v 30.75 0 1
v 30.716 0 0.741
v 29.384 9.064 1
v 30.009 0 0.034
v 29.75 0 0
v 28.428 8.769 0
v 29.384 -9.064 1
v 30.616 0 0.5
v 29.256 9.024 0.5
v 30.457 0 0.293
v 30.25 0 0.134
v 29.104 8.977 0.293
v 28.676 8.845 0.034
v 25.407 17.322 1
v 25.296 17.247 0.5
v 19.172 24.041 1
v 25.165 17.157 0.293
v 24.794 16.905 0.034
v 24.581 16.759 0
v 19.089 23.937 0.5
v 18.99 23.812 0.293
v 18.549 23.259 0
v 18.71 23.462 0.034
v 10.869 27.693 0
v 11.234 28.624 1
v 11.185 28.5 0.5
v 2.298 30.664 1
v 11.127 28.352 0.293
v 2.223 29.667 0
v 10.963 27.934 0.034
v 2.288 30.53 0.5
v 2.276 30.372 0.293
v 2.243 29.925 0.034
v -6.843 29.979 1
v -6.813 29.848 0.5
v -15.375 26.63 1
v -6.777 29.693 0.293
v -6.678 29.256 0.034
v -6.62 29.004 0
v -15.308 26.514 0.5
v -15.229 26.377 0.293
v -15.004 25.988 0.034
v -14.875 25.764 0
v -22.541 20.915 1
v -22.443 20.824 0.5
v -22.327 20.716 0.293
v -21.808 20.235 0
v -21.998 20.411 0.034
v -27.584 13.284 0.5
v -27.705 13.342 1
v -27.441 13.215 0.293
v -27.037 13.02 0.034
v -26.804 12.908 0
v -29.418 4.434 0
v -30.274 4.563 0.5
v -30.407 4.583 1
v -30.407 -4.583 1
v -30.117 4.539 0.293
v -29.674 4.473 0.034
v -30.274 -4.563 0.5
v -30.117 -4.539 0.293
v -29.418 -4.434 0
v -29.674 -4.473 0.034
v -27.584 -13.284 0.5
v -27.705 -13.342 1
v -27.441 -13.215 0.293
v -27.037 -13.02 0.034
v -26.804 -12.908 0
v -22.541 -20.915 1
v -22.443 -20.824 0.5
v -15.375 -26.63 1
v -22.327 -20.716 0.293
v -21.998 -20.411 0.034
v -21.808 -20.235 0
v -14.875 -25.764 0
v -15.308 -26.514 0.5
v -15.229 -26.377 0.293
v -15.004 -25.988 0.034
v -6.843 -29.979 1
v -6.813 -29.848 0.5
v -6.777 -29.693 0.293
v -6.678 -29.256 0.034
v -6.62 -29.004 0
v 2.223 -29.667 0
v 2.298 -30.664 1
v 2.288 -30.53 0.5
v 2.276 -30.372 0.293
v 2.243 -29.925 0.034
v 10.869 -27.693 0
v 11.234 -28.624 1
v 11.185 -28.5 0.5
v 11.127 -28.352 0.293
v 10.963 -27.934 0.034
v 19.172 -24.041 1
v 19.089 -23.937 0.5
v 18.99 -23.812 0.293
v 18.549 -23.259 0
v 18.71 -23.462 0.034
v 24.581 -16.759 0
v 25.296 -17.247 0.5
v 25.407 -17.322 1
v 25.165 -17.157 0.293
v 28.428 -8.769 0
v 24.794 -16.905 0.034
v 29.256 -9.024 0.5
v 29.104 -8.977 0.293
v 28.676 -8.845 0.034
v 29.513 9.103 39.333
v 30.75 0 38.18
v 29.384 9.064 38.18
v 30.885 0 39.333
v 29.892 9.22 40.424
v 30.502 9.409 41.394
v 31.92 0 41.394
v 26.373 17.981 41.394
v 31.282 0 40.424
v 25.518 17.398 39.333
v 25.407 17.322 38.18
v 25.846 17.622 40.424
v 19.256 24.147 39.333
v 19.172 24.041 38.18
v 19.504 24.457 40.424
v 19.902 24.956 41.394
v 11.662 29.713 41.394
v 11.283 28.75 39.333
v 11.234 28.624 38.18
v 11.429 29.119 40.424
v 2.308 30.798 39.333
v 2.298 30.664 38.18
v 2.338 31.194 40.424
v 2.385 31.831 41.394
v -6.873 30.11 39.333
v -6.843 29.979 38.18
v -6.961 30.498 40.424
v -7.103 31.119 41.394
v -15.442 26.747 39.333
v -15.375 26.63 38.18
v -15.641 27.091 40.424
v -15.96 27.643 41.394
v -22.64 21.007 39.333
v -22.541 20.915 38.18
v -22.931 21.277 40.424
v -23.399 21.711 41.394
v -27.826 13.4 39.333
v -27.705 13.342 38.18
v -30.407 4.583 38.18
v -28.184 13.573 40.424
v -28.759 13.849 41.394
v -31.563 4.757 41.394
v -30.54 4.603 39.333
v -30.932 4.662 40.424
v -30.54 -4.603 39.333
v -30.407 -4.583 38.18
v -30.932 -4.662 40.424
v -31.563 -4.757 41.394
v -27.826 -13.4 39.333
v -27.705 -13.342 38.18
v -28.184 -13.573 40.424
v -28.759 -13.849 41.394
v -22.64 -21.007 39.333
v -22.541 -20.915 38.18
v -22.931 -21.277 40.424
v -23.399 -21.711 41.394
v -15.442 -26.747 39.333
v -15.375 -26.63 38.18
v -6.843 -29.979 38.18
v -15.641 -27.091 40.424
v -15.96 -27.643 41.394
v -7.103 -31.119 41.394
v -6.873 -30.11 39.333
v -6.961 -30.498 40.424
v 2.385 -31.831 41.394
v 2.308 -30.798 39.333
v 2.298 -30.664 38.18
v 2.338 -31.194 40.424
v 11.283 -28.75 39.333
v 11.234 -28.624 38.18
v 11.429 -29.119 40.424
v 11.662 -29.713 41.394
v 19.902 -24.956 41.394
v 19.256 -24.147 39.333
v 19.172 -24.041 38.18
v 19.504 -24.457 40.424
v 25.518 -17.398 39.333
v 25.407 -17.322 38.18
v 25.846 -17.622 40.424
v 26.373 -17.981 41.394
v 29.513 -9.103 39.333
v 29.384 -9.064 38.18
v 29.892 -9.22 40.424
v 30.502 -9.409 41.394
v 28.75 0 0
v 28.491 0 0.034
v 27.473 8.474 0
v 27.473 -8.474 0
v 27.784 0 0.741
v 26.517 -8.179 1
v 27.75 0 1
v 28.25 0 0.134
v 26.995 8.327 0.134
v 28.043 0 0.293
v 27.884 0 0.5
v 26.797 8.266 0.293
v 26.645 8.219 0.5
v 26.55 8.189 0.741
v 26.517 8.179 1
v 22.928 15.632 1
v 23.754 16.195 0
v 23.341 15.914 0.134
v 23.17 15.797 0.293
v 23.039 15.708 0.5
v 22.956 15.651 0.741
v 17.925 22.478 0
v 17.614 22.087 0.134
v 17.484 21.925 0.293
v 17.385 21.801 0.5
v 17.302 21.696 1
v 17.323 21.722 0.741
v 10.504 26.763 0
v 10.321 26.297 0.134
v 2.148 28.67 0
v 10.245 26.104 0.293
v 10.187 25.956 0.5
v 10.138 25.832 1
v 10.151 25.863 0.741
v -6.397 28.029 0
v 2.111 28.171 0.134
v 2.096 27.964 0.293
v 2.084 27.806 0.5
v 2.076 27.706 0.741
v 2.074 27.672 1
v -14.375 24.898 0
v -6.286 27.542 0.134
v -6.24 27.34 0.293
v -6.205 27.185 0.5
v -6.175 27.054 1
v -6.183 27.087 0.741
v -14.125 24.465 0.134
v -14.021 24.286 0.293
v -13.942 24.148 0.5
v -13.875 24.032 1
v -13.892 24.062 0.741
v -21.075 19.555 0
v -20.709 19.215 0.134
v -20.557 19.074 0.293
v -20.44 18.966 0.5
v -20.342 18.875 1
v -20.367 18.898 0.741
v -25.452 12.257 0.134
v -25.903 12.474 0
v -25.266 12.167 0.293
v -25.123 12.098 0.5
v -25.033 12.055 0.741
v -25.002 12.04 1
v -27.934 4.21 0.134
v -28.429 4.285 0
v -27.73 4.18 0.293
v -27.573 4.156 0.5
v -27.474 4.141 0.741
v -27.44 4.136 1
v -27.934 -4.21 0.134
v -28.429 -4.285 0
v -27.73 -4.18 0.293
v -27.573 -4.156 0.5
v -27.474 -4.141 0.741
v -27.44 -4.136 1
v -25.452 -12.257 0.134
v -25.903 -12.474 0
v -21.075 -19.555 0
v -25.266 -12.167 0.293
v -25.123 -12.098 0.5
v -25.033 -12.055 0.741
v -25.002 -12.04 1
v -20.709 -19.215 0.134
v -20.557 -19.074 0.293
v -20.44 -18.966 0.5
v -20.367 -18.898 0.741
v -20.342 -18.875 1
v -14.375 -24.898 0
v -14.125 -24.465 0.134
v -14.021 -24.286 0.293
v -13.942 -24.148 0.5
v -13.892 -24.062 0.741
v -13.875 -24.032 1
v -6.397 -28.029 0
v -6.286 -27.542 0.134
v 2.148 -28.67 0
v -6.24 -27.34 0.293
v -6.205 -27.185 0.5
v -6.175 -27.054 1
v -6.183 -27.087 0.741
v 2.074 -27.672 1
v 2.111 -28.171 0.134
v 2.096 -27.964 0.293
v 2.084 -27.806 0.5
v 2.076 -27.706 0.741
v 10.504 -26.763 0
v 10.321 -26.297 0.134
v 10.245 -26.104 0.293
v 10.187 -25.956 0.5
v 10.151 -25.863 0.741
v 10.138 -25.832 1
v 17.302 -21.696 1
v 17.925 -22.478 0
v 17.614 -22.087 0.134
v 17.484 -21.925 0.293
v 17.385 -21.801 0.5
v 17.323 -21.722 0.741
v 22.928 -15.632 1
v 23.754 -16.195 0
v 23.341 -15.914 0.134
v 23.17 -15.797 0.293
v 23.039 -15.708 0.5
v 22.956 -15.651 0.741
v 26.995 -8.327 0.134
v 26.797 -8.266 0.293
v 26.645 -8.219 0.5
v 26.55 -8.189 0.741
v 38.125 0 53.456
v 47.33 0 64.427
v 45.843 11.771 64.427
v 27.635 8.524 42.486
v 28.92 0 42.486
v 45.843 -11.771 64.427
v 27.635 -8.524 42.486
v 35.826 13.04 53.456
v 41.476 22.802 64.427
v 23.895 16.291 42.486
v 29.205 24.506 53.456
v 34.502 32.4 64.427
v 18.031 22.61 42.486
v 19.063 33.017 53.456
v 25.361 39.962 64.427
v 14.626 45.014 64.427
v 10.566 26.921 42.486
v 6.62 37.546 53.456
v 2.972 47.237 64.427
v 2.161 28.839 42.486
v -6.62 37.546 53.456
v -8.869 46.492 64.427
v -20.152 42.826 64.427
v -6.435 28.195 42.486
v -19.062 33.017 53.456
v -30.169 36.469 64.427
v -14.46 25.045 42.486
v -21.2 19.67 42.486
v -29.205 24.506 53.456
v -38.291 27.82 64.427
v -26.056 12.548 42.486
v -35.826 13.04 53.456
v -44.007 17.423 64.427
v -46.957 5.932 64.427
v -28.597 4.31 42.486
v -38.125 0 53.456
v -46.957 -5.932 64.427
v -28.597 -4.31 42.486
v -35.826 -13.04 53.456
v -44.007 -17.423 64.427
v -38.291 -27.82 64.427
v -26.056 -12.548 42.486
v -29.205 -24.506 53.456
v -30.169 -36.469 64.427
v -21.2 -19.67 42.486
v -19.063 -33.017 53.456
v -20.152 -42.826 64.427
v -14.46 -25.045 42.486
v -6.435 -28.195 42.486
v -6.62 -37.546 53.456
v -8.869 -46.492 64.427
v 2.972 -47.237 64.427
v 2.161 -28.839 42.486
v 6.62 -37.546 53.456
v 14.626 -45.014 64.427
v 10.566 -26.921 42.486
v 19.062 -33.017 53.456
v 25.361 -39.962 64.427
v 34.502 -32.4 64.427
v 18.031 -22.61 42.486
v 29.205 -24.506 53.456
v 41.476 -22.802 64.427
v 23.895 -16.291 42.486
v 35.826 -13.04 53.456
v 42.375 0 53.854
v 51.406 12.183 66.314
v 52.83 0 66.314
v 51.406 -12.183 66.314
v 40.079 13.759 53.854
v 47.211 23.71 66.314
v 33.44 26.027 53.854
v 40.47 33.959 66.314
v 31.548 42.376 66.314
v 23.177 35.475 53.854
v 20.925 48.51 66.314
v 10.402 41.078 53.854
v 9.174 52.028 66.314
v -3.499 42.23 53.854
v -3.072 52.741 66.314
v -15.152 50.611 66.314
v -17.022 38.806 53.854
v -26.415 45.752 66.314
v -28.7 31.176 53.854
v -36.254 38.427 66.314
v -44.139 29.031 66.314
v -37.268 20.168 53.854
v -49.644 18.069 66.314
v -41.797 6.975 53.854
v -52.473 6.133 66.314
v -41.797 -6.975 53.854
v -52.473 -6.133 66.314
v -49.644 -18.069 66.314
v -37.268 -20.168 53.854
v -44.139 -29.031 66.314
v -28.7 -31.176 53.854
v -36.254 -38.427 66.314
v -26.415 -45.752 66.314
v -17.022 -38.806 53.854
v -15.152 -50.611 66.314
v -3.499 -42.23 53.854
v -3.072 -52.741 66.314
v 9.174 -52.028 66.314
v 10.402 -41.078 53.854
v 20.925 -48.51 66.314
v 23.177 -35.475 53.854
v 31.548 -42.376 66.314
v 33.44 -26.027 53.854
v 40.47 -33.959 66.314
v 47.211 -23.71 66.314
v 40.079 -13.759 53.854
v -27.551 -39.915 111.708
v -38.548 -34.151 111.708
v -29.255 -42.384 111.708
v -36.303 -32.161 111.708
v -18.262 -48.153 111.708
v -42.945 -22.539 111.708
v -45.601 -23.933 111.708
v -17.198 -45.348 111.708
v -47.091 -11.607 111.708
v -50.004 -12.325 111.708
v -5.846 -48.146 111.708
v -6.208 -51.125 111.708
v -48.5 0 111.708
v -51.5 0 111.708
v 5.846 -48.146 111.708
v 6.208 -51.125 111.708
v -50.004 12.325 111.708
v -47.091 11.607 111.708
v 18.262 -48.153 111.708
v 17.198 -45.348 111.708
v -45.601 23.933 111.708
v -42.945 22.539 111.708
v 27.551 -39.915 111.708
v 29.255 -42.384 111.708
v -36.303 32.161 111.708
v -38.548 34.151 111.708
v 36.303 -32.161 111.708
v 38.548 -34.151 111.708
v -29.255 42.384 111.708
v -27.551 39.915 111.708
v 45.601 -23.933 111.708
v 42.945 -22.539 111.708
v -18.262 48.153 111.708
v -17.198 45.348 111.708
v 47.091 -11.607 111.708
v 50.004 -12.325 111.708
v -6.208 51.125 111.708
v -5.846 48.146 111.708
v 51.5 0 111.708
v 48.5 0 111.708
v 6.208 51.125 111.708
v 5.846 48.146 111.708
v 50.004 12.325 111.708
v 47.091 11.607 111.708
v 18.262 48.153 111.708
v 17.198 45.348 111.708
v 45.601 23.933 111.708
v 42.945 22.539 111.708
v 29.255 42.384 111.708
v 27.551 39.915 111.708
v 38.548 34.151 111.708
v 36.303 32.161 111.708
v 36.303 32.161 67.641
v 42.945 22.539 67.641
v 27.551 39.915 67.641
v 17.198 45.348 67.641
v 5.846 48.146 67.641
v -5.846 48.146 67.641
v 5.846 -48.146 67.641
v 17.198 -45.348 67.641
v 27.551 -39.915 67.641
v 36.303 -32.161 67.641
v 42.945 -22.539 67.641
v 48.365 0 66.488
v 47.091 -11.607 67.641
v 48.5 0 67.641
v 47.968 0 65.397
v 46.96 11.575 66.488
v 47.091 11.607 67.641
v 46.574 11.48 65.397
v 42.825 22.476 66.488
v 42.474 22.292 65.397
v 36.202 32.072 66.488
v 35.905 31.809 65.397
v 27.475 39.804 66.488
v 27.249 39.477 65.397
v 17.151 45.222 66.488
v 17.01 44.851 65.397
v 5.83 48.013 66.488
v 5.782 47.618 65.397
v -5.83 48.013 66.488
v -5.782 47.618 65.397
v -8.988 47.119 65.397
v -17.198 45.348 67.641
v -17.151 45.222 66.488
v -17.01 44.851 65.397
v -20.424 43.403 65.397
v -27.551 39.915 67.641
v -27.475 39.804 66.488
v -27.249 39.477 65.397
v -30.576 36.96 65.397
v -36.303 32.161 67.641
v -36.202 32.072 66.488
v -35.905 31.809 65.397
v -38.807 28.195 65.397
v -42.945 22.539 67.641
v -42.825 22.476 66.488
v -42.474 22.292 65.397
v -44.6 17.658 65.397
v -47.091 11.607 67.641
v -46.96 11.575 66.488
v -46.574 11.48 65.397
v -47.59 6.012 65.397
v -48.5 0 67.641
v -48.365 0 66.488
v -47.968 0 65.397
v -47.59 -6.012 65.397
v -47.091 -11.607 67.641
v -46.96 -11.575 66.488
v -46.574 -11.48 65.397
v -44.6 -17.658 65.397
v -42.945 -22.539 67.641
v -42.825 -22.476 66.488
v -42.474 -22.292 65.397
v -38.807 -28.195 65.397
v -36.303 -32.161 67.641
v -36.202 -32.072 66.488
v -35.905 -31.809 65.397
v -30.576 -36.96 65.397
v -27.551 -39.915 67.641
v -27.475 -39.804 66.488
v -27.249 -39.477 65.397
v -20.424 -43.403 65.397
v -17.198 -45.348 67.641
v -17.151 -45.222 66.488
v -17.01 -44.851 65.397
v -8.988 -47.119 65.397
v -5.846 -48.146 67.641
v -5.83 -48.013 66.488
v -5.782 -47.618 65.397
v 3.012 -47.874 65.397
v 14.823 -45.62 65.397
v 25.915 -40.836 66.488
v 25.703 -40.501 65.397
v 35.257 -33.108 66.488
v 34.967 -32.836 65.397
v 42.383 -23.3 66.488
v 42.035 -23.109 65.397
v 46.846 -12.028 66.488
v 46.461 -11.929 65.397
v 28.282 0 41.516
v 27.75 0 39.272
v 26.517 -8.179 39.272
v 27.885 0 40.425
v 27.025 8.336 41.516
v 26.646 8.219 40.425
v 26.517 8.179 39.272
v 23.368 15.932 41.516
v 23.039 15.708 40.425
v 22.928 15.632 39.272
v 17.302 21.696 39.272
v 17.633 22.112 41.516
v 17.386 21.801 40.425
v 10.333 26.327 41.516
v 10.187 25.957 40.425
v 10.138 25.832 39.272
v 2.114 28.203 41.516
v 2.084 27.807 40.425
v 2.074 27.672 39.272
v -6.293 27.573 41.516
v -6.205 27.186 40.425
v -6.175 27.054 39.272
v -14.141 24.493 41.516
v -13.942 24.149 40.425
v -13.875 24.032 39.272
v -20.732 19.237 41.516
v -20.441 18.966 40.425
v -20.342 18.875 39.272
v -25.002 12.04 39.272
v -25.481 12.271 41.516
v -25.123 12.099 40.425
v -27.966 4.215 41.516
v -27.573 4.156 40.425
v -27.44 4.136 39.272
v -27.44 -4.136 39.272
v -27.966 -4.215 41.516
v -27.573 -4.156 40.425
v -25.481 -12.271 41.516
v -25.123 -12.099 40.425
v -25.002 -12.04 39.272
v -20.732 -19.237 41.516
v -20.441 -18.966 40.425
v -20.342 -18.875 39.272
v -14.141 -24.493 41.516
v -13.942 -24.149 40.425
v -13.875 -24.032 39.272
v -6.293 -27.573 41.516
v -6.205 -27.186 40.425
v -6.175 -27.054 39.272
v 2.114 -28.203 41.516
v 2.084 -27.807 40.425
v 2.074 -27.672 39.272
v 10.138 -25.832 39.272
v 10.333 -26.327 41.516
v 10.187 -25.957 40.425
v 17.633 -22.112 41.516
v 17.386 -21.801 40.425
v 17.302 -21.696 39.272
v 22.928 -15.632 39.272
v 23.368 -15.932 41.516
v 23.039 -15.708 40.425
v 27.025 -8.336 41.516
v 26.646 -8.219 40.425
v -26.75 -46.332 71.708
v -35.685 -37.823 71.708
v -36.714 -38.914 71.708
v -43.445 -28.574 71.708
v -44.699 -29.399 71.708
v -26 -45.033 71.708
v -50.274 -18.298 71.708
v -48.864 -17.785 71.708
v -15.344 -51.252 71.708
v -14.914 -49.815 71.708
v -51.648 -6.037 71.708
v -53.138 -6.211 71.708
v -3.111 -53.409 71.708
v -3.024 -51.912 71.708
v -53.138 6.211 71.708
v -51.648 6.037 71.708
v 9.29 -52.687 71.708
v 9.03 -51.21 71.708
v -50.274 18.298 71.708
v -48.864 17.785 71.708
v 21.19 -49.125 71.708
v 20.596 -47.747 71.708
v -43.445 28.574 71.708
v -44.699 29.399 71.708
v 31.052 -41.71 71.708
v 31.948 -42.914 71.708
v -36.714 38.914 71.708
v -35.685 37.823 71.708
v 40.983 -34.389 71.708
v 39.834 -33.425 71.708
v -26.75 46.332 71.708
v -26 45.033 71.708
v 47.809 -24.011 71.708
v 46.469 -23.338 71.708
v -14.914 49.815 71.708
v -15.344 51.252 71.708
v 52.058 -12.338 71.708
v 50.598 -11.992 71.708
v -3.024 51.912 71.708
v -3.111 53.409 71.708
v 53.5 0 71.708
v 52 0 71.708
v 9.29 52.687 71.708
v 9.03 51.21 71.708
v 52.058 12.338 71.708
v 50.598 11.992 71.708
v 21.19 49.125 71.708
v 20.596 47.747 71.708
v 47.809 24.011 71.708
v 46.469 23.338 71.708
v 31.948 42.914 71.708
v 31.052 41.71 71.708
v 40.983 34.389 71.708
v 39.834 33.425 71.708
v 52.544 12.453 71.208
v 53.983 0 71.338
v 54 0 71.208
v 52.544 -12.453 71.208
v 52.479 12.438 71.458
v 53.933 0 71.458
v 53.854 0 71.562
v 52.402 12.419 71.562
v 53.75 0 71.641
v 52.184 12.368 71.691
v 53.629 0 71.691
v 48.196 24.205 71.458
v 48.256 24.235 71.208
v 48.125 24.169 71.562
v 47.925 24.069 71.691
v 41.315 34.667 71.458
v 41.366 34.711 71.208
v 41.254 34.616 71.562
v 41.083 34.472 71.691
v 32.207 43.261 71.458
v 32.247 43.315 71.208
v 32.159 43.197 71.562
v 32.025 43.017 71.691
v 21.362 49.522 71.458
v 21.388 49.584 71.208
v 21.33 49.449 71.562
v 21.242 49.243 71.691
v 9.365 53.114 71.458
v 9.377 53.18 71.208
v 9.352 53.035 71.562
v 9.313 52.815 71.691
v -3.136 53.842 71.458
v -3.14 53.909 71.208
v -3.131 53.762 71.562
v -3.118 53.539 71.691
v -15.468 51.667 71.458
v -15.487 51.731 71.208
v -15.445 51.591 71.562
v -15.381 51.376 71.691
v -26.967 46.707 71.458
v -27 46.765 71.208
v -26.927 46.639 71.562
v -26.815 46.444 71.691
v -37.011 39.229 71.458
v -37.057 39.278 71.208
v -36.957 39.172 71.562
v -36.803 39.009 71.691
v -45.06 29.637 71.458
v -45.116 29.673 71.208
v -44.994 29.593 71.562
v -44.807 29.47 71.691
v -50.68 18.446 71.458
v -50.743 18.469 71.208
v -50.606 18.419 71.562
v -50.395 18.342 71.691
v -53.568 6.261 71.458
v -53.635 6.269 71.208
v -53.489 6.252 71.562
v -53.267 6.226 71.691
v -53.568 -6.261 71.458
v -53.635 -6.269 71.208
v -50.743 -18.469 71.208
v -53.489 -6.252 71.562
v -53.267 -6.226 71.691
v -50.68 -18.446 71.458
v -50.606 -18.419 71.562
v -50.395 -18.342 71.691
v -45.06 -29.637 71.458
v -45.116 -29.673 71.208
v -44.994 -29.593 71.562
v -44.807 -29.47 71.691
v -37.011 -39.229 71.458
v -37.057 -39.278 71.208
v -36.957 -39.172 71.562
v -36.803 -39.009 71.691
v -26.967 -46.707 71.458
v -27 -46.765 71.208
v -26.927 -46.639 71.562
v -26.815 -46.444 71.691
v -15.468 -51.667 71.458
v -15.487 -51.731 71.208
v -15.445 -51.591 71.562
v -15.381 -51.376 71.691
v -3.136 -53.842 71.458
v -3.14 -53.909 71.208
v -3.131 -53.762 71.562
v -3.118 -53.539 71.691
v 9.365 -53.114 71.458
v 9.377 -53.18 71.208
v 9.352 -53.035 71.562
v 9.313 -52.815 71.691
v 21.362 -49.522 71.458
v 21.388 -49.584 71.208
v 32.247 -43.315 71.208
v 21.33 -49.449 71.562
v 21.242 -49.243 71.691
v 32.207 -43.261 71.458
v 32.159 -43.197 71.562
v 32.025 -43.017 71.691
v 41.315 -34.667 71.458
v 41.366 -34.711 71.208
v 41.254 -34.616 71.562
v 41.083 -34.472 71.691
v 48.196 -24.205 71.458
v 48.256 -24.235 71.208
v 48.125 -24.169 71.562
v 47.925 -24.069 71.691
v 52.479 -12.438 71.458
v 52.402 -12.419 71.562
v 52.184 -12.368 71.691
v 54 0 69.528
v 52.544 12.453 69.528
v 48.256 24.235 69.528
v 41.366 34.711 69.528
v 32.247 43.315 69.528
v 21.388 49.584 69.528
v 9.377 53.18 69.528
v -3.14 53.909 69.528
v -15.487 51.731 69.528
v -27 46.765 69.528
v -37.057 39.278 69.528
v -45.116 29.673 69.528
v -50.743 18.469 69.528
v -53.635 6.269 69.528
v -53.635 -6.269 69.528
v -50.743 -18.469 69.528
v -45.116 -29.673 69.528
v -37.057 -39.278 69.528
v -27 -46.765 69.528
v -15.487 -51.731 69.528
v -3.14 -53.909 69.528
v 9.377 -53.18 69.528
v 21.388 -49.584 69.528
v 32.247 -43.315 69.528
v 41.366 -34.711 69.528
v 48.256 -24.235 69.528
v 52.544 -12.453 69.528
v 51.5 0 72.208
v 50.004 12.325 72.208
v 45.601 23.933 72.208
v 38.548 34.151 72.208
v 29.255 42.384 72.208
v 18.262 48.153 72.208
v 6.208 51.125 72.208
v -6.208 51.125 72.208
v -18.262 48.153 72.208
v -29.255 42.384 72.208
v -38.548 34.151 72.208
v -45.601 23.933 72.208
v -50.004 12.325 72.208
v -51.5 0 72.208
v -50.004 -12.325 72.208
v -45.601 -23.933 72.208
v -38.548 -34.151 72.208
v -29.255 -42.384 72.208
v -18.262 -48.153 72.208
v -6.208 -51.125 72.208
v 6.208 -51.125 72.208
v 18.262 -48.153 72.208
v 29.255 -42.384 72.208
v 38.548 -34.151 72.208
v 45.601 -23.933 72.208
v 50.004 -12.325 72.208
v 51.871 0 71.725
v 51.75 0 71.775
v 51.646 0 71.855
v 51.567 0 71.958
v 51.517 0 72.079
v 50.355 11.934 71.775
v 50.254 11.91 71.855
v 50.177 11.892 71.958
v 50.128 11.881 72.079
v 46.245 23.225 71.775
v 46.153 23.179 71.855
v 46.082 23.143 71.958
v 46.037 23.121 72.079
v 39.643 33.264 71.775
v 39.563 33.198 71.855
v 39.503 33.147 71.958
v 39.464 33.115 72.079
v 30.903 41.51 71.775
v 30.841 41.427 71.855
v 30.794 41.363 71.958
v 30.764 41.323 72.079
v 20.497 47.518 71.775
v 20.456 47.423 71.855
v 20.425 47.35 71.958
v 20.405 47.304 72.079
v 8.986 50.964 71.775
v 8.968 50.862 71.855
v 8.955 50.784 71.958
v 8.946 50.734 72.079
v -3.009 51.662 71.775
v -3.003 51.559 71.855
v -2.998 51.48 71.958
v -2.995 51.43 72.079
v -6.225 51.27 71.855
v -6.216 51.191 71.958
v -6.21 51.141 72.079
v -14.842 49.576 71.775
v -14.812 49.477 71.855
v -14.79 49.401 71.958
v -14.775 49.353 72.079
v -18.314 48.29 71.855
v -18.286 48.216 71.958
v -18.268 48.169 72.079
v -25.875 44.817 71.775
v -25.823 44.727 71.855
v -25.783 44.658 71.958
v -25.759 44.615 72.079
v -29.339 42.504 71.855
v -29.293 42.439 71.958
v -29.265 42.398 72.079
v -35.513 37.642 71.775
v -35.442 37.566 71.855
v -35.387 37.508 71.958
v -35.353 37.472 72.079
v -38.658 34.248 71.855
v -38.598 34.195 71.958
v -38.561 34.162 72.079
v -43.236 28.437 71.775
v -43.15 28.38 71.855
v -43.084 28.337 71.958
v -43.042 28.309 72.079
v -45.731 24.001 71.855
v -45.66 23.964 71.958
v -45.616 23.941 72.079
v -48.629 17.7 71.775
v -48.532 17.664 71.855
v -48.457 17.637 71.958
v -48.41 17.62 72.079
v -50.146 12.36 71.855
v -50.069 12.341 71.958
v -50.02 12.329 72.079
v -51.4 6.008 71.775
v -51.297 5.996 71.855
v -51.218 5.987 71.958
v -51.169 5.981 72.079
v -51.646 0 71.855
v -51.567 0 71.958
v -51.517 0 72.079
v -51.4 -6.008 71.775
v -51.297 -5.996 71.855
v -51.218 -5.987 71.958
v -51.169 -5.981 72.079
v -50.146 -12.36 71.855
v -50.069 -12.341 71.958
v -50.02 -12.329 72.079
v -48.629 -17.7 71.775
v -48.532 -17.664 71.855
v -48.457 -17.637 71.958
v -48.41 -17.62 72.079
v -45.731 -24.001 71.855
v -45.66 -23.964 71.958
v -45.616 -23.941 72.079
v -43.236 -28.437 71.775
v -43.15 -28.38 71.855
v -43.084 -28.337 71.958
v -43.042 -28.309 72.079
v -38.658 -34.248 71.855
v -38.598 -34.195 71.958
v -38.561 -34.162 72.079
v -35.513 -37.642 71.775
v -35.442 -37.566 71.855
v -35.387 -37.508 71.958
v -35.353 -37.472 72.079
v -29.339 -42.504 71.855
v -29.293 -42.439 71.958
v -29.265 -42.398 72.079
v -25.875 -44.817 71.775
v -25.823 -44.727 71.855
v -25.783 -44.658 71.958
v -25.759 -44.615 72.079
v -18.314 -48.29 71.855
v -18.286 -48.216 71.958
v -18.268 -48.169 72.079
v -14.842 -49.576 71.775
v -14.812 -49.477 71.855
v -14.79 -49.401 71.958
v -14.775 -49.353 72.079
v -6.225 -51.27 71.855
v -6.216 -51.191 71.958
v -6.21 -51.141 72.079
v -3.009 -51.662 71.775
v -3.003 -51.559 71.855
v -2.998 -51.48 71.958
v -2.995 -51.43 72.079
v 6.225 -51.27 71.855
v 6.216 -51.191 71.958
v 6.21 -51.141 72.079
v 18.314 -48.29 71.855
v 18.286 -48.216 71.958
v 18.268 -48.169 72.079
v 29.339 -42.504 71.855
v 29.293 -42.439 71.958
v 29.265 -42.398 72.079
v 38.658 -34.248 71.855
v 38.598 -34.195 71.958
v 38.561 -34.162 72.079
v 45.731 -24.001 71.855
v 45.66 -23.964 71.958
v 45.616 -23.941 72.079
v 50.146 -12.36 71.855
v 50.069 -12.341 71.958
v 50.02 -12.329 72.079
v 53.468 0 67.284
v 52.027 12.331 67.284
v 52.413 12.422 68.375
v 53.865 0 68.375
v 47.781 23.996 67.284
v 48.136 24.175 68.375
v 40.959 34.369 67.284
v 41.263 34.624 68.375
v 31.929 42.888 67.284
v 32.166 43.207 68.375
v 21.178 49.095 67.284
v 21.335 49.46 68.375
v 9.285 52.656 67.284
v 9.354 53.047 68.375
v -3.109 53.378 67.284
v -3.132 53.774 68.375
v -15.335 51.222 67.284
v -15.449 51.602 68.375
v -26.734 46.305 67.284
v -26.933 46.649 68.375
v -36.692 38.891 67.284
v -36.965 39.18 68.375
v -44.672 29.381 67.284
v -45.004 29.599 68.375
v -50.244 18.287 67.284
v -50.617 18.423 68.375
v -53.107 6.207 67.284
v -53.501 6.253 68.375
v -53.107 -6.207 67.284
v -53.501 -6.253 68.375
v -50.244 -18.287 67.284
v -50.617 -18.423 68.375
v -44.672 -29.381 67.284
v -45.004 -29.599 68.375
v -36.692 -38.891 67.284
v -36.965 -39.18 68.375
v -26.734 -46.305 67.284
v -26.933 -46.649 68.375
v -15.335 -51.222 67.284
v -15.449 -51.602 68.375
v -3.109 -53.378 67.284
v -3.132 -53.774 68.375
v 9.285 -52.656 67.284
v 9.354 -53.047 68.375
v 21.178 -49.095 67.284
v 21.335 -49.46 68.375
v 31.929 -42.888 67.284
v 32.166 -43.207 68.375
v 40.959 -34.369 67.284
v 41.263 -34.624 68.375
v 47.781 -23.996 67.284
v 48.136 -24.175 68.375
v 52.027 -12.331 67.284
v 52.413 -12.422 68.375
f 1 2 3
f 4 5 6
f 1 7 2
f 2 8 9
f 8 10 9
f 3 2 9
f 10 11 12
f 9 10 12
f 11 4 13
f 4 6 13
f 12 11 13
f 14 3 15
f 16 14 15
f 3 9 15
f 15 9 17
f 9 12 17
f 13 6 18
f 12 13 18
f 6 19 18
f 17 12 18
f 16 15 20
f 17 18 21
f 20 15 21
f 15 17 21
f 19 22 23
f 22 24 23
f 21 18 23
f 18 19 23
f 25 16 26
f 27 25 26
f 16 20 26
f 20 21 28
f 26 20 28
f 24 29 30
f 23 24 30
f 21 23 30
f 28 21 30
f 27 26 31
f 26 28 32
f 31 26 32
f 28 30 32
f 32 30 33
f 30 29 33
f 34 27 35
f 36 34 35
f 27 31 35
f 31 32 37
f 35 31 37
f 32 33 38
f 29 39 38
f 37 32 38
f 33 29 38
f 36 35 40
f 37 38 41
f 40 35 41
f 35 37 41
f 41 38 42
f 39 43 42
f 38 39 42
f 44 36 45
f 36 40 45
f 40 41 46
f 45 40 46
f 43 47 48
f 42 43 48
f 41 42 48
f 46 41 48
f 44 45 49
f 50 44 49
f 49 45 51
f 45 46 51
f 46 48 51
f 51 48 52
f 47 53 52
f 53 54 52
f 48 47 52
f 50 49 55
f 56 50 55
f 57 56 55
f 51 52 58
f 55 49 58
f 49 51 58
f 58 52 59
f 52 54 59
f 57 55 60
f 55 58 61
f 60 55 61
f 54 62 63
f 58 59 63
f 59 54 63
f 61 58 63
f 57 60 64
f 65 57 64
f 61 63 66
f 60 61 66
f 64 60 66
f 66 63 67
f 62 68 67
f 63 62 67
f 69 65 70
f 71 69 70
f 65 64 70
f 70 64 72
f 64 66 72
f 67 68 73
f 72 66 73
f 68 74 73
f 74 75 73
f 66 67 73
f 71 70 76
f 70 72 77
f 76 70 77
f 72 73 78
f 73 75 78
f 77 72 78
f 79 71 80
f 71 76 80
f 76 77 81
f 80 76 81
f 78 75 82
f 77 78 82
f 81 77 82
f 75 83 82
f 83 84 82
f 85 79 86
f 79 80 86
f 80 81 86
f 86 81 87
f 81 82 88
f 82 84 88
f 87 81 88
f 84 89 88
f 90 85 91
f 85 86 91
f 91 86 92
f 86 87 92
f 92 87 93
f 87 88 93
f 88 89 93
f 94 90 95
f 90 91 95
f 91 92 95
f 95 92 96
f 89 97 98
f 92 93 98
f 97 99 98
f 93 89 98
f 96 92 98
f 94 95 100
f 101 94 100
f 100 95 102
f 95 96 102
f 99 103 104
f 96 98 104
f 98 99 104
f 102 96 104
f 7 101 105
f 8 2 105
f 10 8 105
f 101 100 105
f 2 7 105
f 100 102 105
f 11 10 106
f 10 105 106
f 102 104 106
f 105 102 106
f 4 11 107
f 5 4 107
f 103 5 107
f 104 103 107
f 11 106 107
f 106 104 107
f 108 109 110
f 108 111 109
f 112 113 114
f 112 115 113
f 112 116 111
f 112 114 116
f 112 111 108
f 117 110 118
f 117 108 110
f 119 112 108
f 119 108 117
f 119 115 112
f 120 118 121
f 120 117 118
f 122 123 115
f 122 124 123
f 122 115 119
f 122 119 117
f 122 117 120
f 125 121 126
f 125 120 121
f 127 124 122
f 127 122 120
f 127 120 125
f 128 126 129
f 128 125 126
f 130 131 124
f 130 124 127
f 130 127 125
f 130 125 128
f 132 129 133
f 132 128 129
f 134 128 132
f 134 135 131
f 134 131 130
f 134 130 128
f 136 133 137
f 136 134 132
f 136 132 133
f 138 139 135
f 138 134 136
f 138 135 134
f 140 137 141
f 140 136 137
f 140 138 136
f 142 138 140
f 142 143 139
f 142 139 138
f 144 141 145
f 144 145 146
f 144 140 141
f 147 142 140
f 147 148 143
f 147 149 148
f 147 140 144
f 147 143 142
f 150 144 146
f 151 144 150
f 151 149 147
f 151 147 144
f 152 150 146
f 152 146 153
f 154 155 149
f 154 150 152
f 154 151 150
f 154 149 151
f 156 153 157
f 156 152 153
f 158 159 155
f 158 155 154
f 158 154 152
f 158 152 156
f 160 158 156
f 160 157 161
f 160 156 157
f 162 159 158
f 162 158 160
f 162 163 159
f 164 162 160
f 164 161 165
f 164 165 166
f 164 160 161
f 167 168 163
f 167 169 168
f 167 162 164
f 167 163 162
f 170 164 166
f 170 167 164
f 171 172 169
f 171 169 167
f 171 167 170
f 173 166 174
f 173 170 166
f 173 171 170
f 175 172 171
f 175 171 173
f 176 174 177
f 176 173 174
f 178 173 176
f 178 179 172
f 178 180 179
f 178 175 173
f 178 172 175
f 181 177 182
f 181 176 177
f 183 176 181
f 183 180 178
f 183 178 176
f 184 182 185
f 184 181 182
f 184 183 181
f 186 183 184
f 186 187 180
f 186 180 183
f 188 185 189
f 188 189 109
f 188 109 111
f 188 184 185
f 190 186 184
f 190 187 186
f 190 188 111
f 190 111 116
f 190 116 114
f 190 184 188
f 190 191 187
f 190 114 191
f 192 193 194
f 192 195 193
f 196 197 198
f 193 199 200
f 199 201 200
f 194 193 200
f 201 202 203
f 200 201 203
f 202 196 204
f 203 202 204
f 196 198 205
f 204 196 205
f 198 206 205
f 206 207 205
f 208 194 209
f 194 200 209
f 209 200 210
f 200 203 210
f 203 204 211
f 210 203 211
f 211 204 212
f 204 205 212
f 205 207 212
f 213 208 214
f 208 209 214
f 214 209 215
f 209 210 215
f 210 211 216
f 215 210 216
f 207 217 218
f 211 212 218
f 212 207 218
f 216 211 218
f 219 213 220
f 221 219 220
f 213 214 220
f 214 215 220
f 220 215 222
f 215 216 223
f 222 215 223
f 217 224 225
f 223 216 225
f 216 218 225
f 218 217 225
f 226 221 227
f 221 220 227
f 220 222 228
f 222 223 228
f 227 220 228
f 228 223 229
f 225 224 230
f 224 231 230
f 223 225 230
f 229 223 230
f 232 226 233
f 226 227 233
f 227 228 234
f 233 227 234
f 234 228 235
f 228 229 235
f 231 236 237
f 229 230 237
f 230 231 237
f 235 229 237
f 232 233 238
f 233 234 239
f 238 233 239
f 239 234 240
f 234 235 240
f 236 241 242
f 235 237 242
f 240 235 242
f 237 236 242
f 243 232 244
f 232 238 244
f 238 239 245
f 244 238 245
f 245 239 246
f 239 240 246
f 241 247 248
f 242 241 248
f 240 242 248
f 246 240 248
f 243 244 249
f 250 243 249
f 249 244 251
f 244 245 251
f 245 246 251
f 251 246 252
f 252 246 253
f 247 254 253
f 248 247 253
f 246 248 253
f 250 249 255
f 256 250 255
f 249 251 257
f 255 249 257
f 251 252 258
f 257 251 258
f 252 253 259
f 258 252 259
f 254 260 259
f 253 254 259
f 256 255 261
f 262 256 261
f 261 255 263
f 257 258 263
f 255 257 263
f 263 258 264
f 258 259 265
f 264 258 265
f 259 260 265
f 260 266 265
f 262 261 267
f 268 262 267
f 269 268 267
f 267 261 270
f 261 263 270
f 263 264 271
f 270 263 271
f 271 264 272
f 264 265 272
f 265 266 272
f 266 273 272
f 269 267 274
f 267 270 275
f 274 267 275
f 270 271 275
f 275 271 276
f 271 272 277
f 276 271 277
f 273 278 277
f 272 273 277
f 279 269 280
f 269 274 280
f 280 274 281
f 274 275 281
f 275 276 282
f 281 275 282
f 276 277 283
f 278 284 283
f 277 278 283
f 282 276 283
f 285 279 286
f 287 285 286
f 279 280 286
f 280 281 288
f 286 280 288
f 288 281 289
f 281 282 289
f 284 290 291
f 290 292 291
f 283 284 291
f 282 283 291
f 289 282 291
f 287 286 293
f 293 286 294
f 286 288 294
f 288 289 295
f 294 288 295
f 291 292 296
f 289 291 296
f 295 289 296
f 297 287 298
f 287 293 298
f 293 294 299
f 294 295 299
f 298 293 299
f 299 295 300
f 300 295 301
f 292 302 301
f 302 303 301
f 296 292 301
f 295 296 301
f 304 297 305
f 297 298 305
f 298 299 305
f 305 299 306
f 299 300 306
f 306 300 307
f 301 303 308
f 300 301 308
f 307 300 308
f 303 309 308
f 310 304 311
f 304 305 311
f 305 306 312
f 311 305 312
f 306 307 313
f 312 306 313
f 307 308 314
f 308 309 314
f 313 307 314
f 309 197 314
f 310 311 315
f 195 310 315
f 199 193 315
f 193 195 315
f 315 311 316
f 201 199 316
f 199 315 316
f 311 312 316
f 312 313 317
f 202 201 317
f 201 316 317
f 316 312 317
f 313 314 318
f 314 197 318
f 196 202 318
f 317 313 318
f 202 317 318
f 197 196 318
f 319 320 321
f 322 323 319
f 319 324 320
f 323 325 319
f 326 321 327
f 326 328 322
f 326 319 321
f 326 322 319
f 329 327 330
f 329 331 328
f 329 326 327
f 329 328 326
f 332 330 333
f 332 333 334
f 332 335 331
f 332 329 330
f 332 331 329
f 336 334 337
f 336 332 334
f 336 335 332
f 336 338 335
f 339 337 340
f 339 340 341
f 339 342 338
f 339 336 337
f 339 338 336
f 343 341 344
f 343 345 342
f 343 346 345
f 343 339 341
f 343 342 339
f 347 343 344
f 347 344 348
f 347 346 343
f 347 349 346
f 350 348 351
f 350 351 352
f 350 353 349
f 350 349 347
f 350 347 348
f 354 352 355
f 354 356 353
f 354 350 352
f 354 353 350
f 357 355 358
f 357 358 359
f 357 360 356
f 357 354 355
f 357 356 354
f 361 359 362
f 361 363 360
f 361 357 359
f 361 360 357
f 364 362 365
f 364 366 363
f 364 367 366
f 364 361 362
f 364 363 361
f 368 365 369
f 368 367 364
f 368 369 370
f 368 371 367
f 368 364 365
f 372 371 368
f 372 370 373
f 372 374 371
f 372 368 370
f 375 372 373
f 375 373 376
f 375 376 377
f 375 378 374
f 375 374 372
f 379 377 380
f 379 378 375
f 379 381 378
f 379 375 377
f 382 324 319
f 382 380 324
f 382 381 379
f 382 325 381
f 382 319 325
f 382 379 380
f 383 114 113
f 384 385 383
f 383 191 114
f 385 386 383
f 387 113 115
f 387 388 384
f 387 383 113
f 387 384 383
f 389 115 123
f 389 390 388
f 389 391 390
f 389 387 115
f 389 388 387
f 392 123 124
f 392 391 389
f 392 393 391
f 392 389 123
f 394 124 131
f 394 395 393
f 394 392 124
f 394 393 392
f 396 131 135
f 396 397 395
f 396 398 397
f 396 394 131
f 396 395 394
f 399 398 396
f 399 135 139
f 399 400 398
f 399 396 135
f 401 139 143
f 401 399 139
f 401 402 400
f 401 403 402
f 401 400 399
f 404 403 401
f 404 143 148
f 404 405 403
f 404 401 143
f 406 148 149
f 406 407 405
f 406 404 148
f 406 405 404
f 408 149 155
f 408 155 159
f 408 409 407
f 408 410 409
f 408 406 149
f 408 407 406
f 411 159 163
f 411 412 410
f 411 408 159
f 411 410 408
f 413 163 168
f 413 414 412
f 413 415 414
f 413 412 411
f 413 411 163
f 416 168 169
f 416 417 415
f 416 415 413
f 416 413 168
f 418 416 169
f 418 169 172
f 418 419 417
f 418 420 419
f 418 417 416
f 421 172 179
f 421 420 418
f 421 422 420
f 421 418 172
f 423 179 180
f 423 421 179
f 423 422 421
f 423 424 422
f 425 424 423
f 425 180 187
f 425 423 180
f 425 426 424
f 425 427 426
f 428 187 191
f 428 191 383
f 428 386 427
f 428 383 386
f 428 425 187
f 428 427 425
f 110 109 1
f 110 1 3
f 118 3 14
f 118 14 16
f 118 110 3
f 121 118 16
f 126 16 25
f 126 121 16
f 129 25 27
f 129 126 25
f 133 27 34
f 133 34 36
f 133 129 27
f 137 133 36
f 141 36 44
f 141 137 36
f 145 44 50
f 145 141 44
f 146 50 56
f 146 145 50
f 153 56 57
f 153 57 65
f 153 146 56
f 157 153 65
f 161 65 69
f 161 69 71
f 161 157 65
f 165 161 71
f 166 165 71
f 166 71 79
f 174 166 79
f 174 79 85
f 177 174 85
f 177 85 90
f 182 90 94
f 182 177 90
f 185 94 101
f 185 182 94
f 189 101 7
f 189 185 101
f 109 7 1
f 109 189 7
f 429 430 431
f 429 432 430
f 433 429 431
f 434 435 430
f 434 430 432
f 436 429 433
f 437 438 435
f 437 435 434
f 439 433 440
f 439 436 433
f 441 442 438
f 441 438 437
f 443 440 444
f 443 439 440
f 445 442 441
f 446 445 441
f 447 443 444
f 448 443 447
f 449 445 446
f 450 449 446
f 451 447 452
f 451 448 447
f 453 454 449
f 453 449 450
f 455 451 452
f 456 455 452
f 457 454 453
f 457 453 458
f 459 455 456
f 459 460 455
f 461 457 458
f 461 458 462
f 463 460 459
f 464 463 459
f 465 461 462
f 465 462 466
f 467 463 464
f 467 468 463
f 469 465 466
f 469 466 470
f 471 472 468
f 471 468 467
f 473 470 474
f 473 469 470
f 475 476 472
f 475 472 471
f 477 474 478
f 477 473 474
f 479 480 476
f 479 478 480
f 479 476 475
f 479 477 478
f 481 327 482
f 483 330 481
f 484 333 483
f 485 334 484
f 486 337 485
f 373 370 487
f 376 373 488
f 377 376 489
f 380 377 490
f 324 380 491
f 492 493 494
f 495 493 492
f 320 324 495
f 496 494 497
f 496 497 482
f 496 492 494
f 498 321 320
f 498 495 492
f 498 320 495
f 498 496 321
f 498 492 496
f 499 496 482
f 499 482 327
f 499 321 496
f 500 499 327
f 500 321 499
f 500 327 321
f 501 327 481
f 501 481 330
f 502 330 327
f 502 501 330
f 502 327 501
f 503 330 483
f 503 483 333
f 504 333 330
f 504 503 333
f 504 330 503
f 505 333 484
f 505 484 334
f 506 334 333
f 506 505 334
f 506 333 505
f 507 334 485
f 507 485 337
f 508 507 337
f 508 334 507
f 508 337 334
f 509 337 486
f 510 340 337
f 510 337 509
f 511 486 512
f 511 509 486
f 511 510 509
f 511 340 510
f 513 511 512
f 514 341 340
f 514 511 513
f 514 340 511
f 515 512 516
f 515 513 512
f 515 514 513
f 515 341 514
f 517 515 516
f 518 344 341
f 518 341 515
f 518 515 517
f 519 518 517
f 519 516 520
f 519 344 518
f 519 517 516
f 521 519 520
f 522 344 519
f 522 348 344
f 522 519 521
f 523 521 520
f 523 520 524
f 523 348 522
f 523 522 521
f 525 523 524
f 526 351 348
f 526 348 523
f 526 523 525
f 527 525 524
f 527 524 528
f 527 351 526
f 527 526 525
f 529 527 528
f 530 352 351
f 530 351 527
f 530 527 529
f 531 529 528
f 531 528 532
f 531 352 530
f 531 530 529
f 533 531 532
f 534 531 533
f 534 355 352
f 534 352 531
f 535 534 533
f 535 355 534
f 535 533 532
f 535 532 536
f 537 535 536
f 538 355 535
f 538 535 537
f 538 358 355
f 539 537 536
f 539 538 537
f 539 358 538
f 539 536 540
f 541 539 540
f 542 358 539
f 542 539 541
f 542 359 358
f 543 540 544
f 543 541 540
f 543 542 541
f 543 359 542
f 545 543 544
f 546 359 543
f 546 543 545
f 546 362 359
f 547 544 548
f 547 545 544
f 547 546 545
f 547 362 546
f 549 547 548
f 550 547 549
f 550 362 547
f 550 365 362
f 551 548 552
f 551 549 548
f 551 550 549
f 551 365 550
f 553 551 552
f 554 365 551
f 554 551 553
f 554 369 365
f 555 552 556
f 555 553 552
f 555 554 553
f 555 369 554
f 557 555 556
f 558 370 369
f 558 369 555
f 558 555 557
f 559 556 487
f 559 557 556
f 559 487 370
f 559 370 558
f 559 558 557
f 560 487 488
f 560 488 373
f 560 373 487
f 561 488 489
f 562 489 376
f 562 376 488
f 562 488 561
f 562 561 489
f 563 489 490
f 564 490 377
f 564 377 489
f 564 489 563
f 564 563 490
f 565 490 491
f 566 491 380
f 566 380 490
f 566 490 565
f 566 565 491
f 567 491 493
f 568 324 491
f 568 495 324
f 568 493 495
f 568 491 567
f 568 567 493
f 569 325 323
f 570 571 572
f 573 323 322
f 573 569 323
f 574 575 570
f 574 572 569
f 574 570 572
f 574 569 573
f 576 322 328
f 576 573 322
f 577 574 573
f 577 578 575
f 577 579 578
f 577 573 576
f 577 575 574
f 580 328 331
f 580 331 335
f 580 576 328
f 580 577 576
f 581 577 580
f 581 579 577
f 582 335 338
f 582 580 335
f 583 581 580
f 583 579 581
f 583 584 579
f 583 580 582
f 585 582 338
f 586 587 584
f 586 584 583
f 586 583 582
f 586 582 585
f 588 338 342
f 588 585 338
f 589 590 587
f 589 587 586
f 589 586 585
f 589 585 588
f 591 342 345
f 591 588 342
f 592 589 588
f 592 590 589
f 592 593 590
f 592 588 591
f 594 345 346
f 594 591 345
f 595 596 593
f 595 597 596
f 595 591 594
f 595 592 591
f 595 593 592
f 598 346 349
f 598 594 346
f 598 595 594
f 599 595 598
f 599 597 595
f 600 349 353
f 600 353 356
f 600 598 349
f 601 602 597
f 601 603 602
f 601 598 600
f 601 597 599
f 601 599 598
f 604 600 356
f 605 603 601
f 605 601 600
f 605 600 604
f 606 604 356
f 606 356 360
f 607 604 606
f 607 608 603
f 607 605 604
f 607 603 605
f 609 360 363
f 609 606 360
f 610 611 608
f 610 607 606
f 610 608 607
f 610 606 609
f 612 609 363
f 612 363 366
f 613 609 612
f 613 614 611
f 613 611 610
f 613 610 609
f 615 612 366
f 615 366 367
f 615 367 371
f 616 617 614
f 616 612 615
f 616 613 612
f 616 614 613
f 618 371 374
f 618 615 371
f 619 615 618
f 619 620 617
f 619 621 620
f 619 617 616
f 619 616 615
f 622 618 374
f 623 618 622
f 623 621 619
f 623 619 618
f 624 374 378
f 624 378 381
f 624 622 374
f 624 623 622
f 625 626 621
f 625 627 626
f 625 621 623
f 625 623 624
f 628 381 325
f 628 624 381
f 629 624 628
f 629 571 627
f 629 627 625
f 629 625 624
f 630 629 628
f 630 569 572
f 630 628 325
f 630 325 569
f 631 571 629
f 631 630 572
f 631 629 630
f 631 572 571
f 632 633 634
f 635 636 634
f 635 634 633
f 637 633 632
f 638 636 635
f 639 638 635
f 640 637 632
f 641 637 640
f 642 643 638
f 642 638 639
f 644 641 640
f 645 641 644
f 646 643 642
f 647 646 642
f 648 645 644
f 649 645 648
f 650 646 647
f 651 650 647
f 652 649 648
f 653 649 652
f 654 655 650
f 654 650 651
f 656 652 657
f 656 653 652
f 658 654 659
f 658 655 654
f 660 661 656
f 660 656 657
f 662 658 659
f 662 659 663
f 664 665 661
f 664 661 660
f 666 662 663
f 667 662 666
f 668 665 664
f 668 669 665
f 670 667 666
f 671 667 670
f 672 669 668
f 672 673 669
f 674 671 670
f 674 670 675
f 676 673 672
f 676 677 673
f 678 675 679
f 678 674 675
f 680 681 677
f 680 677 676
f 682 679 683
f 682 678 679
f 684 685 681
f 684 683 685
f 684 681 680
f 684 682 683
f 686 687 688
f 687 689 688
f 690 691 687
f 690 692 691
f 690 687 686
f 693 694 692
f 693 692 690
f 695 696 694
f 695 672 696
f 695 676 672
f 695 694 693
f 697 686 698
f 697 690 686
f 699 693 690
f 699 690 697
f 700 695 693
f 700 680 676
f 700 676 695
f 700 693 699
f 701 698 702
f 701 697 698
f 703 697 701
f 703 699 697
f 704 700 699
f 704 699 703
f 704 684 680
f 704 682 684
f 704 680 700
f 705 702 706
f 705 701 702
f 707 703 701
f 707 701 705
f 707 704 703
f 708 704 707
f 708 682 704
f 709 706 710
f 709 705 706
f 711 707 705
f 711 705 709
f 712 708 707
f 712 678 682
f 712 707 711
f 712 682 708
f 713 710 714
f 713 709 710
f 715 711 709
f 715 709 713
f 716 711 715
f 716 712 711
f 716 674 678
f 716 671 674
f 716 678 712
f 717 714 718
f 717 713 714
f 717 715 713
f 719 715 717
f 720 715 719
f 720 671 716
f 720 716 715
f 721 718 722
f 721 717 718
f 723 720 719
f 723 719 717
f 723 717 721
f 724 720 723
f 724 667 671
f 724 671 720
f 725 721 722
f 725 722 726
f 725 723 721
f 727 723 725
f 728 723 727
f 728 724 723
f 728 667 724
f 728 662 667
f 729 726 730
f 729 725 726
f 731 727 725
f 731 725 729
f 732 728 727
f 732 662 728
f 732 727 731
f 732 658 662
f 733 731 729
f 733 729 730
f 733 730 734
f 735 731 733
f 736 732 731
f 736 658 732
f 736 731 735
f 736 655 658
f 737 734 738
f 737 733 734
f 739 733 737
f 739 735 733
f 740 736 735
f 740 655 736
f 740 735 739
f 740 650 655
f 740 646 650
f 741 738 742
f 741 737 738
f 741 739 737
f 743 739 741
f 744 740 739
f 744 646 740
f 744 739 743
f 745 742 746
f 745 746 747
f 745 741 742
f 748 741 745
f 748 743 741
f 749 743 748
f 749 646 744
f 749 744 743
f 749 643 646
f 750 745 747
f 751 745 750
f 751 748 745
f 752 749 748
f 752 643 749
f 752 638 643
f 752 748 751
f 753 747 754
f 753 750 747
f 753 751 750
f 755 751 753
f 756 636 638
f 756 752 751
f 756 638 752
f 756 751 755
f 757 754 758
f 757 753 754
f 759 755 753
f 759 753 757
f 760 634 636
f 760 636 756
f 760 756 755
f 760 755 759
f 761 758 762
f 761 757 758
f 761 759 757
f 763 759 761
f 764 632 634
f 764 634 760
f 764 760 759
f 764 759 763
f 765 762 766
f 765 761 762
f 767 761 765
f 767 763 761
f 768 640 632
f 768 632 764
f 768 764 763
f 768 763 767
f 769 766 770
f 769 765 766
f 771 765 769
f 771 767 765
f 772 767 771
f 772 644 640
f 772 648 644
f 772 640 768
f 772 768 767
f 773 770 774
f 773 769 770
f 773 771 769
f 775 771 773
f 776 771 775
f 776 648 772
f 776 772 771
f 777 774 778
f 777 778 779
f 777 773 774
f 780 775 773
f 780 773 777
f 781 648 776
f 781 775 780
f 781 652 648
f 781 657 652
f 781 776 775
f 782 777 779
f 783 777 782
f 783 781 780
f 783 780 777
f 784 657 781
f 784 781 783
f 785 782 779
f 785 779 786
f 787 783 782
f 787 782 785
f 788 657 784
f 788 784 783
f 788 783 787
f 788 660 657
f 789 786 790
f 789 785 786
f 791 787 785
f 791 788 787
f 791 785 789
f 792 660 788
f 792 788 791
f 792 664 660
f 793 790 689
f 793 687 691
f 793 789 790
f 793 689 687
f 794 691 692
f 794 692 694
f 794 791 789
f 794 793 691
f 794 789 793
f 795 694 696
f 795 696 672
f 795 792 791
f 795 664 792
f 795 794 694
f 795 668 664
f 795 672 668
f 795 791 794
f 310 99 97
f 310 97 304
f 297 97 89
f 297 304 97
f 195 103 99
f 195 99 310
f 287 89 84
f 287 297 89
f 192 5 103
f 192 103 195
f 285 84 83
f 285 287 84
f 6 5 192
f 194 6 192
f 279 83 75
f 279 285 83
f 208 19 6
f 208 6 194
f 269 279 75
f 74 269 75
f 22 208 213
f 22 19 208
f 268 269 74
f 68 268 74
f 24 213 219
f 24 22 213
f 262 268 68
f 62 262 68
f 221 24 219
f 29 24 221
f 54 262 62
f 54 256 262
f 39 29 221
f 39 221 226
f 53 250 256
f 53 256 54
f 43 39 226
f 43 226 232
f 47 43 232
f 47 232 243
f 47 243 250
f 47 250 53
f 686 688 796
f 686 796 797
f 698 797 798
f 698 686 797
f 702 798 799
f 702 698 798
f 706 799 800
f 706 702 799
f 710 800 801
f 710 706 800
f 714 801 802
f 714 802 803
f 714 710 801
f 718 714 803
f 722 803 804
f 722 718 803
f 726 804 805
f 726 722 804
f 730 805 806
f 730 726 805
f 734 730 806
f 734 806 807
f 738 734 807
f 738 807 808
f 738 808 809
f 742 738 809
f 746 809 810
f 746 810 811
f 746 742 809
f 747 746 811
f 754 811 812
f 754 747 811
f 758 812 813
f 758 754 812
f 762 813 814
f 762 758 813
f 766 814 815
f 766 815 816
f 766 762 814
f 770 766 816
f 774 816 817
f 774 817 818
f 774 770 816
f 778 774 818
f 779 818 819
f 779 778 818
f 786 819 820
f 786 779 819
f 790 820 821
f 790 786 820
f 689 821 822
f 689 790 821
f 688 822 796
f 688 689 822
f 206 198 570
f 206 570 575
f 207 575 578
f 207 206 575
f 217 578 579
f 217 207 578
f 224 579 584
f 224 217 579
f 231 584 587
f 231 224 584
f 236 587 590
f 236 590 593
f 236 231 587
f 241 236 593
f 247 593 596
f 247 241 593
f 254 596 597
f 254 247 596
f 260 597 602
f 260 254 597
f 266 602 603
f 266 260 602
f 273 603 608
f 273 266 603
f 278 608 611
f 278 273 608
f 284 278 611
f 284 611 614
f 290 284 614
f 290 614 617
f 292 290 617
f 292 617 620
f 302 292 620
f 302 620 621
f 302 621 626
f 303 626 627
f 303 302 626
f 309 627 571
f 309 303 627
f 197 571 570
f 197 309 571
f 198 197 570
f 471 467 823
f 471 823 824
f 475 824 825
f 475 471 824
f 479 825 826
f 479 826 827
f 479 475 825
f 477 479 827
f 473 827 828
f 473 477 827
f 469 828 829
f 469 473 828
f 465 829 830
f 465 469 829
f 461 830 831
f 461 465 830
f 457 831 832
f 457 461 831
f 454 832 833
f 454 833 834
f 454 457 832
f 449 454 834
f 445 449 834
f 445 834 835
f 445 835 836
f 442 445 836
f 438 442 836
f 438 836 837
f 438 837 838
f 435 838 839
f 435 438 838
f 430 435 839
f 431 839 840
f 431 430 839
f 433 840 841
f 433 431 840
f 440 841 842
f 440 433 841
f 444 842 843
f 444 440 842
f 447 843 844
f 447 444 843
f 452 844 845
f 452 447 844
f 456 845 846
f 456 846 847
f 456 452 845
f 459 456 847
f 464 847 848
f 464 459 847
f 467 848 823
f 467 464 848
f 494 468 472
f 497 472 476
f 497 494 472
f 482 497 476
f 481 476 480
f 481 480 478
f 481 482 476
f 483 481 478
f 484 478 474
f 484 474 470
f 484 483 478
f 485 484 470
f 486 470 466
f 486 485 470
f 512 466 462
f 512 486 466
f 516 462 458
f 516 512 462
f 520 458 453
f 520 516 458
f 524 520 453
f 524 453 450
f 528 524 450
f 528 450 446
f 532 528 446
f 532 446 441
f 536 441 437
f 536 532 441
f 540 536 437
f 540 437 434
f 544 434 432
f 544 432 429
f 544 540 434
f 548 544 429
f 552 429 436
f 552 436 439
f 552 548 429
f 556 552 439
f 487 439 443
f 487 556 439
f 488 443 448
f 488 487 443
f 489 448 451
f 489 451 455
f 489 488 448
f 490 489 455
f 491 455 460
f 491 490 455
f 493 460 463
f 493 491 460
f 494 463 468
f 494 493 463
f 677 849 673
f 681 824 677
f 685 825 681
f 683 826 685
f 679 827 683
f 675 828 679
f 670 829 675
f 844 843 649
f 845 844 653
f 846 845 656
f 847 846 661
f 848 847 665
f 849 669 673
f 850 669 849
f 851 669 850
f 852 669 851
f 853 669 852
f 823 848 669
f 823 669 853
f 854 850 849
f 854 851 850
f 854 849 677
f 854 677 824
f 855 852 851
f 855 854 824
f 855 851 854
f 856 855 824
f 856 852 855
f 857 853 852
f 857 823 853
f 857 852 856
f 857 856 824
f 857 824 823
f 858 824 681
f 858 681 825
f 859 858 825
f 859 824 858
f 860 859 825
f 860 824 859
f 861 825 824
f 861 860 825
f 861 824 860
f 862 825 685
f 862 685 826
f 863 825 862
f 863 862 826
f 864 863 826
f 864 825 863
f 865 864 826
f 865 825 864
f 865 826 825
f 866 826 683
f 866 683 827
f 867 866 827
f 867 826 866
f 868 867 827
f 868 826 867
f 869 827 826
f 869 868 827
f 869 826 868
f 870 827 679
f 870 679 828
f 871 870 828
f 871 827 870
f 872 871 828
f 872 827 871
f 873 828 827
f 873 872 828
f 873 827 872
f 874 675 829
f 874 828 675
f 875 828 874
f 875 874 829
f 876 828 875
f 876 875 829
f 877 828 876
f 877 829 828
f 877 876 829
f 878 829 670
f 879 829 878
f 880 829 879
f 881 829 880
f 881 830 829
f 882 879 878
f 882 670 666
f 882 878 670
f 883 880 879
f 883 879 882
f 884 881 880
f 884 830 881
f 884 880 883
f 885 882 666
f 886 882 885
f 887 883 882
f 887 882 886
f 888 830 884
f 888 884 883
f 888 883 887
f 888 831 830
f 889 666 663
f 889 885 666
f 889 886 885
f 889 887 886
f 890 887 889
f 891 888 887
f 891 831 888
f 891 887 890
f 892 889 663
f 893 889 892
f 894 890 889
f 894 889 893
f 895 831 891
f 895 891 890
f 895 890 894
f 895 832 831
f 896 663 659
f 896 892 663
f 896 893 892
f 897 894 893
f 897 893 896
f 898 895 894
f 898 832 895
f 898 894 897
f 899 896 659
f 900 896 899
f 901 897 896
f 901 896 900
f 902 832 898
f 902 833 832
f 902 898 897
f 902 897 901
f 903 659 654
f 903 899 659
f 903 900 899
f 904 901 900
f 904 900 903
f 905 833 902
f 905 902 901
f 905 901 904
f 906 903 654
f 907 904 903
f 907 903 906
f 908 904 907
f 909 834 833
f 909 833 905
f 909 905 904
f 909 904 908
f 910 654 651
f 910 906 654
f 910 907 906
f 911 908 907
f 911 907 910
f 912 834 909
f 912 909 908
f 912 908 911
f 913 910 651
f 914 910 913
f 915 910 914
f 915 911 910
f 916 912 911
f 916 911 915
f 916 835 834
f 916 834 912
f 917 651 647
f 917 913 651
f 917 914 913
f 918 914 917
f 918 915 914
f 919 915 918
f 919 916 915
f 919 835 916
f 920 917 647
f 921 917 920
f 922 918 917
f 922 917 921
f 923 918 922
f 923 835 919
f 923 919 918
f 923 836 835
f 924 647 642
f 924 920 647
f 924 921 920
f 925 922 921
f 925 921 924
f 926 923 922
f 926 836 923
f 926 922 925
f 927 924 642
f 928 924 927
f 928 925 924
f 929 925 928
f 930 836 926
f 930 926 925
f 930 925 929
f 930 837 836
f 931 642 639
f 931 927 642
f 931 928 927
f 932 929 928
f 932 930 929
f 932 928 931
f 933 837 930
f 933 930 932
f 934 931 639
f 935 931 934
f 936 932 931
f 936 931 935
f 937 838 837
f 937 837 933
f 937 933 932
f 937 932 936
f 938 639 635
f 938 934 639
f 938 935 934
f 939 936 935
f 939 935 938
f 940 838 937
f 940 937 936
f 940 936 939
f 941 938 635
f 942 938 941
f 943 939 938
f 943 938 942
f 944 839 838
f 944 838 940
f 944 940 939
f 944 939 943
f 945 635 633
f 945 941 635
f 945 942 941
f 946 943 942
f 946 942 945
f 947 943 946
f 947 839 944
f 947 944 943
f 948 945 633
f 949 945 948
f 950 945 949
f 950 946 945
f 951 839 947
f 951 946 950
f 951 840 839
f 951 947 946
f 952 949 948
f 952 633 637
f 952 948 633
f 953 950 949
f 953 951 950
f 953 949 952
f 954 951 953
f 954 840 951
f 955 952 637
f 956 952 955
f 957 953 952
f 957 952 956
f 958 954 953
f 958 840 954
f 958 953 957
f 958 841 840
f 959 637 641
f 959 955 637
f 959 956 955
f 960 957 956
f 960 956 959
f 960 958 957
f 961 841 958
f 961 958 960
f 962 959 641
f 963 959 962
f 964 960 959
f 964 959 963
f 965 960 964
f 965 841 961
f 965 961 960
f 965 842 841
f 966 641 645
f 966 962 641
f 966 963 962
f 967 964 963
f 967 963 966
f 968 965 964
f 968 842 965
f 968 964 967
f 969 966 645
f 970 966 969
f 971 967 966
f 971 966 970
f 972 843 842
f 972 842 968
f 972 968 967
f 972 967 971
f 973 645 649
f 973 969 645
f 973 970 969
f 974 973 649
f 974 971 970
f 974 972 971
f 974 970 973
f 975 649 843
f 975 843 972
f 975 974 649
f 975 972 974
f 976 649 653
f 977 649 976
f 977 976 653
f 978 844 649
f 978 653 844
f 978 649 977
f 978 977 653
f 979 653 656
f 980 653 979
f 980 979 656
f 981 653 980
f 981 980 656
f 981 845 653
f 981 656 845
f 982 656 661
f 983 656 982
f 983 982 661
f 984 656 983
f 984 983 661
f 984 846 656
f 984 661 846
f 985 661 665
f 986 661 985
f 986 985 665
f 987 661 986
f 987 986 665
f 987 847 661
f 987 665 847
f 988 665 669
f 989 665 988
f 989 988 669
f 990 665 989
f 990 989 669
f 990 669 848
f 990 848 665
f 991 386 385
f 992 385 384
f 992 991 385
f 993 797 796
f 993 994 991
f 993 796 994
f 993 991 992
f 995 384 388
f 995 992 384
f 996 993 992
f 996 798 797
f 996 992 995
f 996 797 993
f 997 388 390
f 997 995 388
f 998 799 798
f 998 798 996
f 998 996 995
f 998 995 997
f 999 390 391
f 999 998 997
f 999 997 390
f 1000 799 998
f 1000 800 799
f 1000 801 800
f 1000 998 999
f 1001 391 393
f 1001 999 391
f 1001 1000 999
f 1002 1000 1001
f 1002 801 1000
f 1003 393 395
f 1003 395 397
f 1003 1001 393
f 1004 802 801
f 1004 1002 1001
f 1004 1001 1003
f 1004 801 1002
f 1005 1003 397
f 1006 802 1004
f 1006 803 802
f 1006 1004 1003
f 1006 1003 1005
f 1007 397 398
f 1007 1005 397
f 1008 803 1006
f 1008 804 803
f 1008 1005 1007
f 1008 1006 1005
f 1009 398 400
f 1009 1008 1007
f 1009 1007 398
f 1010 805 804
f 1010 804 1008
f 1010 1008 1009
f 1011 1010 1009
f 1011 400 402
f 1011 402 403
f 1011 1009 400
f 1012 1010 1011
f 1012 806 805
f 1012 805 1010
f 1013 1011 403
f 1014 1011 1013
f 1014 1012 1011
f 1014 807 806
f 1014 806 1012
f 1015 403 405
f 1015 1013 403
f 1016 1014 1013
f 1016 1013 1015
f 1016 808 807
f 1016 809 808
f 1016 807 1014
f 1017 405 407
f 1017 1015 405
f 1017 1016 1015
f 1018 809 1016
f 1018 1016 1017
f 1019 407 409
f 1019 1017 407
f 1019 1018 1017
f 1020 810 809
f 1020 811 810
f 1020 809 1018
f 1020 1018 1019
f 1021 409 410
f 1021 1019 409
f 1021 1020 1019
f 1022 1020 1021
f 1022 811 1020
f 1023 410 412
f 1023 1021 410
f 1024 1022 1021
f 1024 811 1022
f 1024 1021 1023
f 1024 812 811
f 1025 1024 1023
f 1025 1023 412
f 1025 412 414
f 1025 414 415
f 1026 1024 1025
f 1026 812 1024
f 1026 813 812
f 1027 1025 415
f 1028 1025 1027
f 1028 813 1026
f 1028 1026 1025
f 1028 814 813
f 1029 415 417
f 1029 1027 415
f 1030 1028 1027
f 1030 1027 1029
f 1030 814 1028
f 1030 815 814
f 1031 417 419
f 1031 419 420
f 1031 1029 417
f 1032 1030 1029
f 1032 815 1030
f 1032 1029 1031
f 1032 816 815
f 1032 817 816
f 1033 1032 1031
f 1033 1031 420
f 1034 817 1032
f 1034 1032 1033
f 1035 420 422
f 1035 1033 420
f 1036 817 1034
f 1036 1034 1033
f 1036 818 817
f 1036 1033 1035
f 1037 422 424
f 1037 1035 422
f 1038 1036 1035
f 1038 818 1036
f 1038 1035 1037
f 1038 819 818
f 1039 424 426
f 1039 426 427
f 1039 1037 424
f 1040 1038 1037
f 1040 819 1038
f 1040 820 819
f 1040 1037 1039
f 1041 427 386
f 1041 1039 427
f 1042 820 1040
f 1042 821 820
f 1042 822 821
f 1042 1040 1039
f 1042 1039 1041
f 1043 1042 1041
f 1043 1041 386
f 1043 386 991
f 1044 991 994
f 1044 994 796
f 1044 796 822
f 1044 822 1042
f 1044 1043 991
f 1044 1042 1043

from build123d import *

# Parameters (mm, degrees)
F2_R = 0.5
F3_R = 1


# Not quite as in the source:
# - a feature names something its author has since deleted; it is built from what else it names


with BuildPart() as f1:
    # F0 (on Front) → F1 (revolve)
    with BuildSketch(Plane.XZ):
        with BuildLine():
            Line((27.75, 0), (30.75, 0))
            Line((30.75, 0), (30.75, 38.1801488287))
            ThreePointArc((30.75, 38.1801488287), (31.0515368961, 39.8902495453), (31.9197777844, 41.3940868771))
            Line((31.9197777844, 41.3940868771), (52.8302222156, 66.3141841507))
            ThreePointArc((52.8302222156, 66.3141841507), (53.6984631039, 67.8180214825), (54, 69.5281221991))
            Line((54, 69.5281221991), (54, 71.7082710278))
            Line((54, 71.7082710278), (51.5, 71.7082710278))
            Line((51.5, 71.7082710278), (51.5, 111.7082710278))
            Line((51.5, 111.7082710278), (48.5, 111.7082710278))
            Line((48.5, 111.7082710278), (48.5, 67.6406489205))
            ThreePointArc((48.5, 67.6406489205), (48.1984631039, 65.9305482038), (47.3302222156, 64.426710872))
            Line((47.3302222156, 64.426710872), (28.9197777844, 42.4859975799))
            ThreePointArc((28.9197777844, 42.4859975799), (28.0515368961, 40.9821602481), (27.75, 39.2720595315))
            Line((27.75, 39.2720595315), (27.75, 0))
        make_face()
    revolve(axis=Axis((0, 0, 46.6845482588), (0, 0, 1)))

    # F2
    f2_edges = [f1.edges().sort_by_distance(p)[0] for p in [
        (-54, 0, 71.708271),
        (-51.5, 0, 71.708271),
    ]]
    fillet(f2_edges, radius=F2_R)

    # F3
    f3_edges = [f1.edges().sort_by_distance(p)[0] for p in [
        (-30.75, 0, 0),
        (-27.75, 0, 0),
    ]]
    fillet(f3_edges, radius=F3_R)


solid = f1.part
